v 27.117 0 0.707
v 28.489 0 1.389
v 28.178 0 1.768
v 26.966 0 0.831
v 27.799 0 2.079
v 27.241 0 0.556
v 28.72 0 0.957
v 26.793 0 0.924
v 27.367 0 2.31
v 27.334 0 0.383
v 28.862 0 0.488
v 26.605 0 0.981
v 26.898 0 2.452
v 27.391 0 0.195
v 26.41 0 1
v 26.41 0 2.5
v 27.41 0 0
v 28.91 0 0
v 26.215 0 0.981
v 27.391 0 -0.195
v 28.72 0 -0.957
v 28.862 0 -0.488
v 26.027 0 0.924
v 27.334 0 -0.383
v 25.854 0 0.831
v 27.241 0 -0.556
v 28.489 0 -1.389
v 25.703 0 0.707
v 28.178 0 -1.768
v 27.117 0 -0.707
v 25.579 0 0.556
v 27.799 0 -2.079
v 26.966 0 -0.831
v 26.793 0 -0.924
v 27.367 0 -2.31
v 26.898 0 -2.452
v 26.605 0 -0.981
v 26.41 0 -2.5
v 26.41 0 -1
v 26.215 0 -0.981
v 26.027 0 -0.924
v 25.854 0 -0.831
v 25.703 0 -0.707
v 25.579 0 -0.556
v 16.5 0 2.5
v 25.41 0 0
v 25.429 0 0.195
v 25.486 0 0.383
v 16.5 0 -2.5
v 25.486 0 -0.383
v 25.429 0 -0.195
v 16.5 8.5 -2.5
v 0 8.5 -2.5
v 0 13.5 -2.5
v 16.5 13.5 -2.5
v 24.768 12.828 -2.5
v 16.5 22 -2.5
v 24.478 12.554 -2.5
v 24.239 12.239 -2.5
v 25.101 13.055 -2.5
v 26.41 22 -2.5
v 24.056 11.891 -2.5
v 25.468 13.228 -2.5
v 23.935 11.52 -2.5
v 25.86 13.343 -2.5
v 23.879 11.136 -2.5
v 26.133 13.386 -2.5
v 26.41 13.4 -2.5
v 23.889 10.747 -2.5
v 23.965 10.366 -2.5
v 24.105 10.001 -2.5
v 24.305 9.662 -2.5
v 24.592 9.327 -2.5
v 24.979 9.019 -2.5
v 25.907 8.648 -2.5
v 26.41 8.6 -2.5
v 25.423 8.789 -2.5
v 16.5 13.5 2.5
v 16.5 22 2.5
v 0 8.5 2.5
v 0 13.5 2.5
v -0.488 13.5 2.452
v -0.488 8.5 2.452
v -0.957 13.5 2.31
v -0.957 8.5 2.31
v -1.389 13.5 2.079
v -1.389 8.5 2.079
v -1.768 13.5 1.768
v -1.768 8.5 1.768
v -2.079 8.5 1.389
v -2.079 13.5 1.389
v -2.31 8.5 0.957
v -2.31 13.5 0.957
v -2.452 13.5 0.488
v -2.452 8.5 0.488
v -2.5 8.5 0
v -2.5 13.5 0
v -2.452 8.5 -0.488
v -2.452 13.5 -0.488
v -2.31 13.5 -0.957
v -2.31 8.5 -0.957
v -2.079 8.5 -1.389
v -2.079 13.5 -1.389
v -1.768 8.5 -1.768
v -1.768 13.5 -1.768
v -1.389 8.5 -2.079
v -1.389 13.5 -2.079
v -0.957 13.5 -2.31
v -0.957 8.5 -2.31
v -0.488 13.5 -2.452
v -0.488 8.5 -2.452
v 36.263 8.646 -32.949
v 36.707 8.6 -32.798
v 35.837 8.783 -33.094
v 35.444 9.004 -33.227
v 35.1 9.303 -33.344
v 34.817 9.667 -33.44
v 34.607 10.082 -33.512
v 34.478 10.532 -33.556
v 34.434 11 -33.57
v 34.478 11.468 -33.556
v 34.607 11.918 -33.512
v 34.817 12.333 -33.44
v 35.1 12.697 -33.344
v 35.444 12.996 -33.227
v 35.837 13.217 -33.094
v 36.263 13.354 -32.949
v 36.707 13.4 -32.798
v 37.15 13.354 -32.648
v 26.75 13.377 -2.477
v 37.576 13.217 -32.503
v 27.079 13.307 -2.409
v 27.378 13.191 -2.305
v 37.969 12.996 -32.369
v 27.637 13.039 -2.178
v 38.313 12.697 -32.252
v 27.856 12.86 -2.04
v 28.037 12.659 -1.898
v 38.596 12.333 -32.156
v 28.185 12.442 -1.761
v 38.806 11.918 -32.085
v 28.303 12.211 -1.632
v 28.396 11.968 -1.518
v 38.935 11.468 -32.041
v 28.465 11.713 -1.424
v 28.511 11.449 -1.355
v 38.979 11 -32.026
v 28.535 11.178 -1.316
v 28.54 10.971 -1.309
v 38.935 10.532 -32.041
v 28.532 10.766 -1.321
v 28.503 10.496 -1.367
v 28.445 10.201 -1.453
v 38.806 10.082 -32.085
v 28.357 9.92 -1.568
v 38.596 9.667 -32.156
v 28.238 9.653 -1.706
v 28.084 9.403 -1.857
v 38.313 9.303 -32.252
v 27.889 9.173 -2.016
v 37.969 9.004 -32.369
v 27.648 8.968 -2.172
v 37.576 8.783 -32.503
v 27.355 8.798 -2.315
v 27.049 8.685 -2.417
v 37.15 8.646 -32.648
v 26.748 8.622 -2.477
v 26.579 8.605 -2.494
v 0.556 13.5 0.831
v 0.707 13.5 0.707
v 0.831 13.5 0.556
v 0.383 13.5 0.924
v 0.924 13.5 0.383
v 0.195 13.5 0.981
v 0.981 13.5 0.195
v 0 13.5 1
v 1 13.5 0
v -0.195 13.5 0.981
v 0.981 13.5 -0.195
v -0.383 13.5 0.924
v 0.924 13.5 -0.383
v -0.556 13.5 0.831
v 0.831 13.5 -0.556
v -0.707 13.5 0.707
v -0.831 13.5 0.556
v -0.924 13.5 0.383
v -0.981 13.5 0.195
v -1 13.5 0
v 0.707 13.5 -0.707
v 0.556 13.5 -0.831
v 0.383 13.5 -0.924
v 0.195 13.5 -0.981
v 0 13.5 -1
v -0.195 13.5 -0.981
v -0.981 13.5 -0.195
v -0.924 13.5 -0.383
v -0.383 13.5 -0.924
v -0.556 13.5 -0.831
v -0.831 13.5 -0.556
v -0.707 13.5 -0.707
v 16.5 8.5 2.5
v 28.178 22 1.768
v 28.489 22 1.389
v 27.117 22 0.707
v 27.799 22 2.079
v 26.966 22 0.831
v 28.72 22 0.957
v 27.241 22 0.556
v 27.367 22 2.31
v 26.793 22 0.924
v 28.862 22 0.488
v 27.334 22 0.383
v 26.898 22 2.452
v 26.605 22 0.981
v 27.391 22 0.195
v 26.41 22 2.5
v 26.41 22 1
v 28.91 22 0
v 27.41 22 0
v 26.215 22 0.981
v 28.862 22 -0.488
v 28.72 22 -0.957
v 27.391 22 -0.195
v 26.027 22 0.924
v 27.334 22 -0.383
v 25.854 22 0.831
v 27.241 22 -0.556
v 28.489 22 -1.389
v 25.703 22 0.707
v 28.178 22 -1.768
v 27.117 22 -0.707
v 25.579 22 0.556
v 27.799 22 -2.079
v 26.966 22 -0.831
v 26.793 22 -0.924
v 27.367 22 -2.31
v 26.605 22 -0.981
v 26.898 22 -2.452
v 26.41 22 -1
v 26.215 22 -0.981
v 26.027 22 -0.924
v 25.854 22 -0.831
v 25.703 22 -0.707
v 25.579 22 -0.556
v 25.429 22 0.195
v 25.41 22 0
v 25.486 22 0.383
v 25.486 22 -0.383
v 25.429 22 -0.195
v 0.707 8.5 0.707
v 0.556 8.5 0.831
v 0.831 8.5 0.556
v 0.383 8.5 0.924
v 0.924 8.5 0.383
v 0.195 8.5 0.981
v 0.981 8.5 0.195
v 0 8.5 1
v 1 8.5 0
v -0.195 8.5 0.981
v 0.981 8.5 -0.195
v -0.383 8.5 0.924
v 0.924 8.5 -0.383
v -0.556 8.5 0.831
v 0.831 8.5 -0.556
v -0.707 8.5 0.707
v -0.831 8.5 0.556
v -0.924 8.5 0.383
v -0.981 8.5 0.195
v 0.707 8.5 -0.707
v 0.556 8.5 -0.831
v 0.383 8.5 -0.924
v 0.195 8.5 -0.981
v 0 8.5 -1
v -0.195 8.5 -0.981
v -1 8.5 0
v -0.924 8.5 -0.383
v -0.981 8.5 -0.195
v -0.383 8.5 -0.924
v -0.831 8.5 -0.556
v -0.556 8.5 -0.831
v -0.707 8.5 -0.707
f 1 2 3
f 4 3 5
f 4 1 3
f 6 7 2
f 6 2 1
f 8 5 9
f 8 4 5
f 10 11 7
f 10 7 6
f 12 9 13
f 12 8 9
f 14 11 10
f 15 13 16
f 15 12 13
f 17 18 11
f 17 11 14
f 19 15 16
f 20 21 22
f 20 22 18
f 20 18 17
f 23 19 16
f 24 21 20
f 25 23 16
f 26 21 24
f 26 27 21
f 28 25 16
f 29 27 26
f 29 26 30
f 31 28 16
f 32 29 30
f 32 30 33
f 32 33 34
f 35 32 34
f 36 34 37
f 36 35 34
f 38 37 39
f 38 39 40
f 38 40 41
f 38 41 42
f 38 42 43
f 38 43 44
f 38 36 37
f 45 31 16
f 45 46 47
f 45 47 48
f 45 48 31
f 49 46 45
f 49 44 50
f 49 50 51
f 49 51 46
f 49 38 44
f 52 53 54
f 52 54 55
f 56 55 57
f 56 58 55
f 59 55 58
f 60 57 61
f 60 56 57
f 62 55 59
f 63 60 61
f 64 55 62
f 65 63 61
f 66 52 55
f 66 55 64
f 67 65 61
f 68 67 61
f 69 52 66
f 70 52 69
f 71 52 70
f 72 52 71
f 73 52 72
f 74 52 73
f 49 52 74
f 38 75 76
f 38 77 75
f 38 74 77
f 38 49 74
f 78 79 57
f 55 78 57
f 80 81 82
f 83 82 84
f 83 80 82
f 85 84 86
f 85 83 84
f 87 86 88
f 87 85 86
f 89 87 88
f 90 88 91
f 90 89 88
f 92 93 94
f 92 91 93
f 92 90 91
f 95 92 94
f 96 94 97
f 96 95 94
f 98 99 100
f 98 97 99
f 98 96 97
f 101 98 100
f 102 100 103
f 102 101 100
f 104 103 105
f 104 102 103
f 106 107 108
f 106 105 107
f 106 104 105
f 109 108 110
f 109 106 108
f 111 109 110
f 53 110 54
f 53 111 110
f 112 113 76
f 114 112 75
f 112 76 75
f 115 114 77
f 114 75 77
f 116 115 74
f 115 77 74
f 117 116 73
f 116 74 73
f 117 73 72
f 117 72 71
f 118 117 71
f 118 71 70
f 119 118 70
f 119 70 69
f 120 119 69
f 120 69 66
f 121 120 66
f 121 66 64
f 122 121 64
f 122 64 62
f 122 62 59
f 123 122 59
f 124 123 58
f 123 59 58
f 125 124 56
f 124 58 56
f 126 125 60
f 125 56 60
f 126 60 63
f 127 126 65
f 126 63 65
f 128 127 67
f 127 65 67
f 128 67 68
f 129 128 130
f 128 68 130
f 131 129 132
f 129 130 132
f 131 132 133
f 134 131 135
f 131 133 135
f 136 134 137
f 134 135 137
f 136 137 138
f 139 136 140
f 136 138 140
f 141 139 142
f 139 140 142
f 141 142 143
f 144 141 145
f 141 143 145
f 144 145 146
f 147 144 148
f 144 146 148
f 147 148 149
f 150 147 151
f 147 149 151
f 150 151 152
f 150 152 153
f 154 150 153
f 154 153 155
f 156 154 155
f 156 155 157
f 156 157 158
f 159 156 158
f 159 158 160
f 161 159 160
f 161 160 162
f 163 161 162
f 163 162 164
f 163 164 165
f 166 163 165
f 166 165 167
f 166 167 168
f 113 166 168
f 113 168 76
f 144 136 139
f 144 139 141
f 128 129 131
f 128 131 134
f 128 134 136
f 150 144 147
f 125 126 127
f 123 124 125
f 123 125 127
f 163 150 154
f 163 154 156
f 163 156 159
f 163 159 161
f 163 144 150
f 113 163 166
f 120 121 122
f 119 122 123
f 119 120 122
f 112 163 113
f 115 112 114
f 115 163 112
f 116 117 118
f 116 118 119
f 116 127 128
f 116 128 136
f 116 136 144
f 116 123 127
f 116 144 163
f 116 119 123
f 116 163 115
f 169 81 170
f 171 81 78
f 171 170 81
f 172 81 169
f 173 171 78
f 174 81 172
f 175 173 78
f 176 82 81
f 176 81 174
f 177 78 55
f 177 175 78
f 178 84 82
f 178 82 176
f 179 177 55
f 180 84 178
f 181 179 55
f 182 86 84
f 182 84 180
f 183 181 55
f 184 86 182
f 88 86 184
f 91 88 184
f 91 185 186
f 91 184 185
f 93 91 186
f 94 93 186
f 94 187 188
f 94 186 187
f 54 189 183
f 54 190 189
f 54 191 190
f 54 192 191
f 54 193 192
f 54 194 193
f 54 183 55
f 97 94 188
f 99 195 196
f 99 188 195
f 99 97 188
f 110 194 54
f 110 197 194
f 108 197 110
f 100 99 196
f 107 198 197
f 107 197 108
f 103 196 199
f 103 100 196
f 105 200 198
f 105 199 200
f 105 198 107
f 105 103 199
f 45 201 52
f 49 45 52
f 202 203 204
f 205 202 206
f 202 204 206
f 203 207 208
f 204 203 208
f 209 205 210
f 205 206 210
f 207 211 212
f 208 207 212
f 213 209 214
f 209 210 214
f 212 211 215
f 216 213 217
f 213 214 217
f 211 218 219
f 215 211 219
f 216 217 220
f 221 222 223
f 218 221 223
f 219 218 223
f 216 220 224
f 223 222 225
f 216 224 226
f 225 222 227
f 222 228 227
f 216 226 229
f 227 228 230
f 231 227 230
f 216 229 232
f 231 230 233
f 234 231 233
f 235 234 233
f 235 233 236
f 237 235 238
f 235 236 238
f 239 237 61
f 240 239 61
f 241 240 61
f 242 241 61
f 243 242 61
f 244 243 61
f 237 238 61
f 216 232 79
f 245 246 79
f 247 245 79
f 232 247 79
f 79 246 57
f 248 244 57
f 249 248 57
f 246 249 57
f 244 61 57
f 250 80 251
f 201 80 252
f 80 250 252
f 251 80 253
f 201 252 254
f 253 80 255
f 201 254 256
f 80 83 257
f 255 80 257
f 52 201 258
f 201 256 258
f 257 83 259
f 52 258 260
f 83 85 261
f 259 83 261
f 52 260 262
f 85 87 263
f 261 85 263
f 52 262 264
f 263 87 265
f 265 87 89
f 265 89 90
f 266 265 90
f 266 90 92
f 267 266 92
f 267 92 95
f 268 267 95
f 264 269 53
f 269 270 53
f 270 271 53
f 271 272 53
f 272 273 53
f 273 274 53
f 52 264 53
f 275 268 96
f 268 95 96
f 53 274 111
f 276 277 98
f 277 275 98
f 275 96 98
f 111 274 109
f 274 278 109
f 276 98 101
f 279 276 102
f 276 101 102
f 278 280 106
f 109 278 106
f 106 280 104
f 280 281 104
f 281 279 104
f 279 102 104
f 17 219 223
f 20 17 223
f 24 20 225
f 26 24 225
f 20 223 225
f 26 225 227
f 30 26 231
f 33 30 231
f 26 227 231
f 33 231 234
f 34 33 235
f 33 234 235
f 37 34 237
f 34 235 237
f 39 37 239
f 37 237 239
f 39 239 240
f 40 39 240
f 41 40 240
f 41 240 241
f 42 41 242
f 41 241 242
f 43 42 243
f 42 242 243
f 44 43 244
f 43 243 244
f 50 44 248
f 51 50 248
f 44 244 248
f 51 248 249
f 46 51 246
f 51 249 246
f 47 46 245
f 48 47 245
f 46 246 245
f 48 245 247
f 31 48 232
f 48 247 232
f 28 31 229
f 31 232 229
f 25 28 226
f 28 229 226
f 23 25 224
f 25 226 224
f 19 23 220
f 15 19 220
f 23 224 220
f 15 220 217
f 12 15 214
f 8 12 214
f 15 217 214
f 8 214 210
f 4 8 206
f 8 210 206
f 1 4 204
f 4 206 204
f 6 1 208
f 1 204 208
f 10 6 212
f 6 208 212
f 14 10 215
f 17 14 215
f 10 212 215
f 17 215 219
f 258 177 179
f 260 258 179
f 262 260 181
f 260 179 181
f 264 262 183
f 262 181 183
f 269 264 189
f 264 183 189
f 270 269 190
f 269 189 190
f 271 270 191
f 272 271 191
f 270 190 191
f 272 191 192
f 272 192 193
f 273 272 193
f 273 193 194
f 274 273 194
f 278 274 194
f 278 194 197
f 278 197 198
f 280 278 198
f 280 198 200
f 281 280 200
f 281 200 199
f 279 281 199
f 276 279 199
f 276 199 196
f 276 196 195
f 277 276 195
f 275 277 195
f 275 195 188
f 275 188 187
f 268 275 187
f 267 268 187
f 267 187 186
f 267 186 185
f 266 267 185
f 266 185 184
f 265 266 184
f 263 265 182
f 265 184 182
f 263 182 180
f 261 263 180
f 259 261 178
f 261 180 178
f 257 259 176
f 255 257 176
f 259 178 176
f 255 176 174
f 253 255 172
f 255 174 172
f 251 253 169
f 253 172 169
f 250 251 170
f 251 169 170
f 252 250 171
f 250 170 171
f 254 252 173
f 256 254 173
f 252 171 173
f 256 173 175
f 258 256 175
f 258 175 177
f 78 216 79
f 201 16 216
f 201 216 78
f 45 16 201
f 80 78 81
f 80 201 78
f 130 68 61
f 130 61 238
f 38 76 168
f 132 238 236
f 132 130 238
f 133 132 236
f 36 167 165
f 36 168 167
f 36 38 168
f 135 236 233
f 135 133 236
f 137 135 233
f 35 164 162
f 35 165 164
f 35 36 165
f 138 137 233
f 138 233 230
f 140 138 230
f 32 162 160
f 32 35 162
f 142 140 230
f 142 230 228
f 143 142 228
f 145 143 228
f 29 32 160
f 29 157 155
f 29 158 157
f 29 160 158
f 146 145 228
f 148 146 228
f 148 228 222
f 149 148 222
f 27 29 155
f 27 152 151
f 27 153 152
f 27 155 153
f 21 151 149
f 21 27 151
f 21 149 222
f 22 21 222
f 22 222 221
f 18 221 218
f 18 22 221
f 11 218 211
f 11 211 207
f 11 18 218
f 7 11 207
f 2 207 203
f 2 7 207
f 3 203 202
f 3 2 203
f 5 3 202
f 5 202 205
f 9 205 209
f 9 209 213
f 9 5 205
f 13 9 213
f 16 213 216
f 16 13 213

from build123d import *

# Parameters (mm, degrees)
BOSS_EXTRUDE1_DEPTH = 22
SKETCH2_R           = 1
CUT_EXTRUDE1_DEPTH  = 22
SKETCH3_W           = 5
SKETCH3_H           = 8.5
CUT_EXTRUDE7_DEPTH  = 19
BOSS_EXTRUDE3_START = -0.815625
SKETCH5_R           = 2.4
BOSS_EXTRUDE3_DEPTH = 32.815625


with BuildPart() as part:
    # Sketch1 → Boss-Extrude1 (new body)
    with BuildSketch(Plane(origin=(0, 0, 0), x_dir=(1, 0, 0), z_dir=(0, 1, 0))):
        with BuildLine():
            Line((0, 2.5), (26.41, 2.5))
            ThreePointArc((26.41, 2.5), (28.91, 0), (26.41, -2.5))
            Line((26.41, -2.5), (0, -2.5))
            ThreePointArc((0, -2.5), (-2.5, 0), (0, 2.5))
        make_face()
    extrude(amount=BOSS_EXTRUDE1_DEPTH)

    # Sketch2 → Cut-Extrude1 (cut)
    with BuildSketch(Plane(origin=(0, 22, 0), x_dir=(1, 0, 0), z_dir=(0, 1, 0))):
        Circle(SKETCH2_R)
        with Locations((26.41, 0)):
            Circle(SKETCH2_R)
    extrude(amount=-CUT_EXTRUDE1_DEPTH, mode=Mode.SUBTRACT)

    # Sketch3 → Cut-Extrude7 (cut)
    with BuildSketch(Plane(origin=(-2.5, 0, 0), x_dir=(0, 0, -1), z_dir=(1, 0, 0))):
        with Locations((0, 17.75)):
            Rectangle(SKETCH3_W, SKETCH3_H)
        with Locations((0, 4.25)):
            Rectangle(SKETCH3_W, SKETCH3_H)
    extrude(amount=CUT_EXTRUDE7_DEPTH, mode=Mode.SUBTRACT)

    # Sketch5 → Boss-Extrude3 (add)
    with BuildSketch(Plane(origin=(3.496027694, 0, -10.287166689), x_dir=(0, -1, 0), z_dir=(0.321769987, 0, -0.946817868)).offset(BOSS_EXTRUDE3_START)):
        with Locations((-11, -24.201034934)):
            Circle(SKETCH5_R)
    extrude(amount=BOSS_EXTRUDE3_DEPTH)


solid = part.part
